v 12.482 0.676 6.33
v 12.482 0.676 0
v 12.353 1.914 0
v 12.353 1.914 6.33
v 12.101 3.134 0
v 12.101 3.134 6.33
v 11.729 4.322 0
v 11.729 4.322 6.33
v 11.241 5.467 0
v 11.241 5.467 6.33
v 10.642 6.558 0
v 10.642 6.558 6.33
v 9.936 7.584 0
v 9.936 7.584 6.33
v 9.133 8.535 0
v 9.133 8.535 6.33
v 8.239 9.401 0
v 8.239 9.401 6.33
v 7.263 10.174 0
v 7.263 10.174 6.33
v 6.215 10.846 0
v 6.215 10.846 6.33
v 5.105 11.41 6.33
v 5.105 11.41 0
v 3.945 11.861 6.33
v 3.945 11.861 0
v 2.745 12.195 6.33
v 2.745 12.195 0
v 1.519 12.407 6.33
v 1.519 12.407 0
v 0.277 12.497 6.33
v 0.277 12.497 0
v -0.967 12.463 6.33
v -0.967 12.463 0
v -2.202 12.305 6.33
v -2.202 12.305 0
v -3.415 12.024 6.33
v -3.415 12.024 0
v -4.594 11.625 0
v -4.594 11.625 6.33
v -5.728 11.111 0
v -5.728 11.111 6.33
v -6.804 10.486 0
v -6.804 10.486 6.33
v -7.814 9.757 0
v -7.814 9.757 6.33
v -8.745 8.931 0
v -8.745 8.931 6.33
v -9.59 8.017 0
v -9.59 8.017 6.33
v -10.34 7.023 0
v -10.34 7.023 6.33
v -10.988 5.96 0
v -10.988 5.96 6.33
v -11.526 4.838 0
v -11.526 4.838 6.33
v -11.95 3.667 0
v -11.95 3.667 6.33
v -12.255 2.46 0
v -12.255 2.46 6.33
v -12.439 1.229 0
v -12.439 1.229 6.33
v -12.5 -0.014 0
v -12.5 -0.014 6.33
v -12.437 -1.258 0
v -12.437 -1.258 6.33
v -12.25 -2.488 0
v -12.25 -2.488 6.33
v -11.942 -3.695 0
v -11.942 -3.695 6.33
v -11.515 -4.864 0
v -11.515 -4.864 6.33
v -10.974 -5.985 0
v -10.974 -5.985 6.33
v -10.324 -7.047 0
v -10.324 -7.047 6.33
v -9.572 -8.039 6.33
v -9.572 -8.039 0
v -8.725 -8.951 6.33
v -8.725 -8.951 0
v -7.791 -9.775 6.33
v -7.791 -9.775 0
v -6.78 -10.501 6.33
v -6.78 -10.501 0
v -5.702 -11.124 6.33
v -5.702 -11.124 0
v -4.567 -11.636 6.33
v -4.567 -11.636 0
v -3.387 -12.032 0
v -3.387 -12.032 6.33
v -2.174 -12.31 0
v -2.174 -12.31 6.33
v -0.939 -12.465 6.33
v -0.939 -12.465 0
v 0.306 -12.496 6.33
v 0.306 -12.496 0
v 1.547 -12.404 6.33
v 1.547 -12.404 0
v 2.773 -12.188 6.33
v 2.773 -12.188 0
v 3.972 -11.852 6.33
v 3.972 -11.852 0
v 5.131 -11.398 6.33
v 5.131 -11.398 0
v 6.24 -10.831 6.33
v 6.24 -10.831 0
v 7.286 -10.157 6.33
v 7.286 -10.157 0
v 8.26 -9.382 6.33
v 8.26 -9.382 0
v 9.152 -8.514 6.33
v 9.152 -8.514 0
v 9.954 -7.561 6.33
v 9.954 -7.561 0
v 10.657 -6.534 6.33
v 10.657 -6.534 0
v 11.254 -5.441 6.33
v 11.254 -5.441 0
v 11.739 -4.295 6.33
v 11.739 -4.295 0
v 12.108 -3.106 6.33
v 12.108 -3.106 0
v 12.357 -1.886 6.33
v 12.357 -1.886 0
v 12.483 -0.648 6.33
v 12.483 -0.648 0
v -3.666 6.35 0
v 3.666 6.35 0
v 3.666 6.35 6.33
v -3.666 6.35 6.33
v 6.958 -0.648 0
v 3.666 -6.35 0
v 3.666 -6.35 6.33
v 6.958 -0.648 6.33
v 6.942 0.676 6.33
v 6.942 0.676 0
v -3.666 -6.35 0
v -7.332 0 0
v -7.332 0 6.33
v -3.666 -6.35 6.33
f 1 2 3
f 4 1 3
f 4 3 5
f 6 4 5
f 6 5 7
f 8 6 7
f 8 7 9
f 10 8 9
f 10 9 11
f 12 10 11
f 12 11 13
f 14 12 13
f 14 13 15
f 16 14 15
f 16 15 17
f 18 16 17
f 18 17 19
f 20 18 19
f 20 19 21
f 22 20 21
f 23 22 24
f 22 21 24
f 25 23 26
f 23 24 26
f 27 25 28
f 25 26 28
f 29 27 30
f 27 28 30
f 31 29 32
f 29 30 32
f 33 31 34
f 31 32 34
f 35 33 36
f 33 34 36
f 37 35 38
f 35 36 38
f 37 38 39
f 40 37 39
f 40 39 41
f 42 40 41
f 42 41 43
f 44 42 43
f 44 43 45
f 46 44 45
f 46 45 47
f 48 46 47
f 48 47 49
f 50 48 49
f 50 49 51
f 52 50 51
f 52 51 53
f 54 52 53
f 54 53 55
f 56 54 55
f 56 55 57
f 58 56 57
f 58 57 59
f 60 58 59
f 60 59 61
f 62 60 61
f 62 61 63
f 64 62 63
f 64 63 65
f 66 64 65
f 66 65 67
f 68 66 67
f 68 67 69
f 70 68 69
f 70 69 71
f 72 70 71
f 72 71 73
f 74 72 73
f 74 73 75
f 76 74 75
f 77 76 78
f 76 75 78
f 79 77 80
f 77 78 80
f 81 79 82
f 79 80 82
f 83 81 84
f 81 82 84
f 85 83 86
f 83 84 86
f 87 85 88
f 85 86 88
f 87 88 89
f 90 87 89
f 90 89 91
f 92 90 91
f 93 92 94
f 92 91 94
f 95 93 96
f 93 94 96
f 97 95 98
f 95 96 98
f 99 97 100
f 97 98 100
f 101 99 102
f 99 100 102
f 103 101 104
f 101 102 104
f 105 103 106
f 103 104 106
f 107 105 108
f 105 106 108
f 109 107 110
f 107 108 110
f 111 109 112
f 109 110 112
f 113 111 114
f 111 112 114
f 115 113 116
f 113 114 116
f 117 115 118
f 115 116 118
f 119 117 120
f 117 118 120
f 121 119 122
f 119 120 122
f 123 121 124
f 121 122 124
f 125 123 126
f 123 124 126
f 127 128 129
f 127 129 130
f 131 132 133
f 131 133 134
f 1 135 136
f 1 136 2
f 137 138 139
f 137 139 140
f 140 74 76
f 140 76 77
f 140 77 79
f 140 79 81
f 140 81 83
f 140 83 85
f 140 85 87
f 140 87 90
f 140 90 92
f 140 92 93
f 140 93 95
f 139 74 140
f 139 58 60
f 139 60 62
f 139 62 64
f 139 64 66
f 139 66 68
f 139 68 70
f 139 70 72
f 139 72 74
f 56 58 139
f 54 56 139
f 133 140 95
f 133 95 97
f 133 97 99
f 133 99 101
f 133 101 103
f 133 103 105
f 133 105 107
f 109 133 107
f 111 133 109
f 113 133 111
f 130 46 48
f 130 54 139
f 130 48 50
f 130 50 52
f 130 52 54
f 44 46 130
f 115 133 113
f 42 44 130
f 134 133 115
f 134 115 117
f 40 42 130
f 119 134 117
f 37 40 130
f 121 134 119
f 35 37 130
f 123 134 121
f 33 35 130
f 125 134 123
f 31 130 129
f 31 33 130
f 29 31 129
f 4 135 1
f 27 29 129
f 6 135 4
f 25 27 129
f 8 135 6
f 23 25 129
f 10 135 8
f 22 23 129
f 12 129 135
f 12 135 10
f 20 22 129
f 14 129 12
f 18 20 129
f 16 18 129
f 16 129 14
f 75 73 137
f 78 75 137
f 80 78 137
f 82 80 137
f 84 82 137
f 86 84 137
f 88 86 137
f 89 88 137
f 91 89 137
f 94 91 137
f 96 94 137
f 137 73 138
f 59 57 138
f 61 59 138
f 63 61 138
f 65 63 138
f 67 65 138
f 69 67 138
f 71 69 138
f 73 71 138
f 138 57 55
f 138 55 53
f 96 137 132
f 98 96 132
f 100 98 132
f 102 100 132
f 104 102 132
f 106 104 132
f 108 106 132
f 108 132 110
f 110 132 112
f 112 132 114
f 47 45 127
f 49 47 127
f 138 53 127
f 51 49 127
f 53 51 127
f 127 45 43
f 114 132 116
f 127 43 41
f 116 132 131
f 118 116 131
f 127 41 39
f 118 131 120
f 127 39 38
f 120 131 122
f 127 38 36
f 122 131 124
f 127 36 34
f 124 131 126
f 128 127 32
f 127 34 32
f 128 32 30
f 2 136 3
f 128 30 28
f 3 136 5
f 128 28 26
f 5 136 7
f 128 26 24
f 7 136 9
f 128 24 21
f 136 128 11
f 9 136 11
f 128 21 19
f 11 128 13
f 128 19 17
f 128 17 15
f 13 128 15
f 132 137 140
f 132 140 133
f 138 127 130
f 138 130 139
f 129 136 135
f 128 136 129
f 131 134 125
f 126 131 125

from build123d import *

# Parameters (mm, degrees)
SKETCH1_R           = 12.5
BOSS_EXTRUDE1_DEPTH = 6.33
SKETCH2_W           = 8.461167653
SKETCH2_H           = 1.32394958
CUT_EXTRUDE1_DEPTH  = 7.33


with BuildPart() as part:
    # Sketch1 → Boss-Extrude1 (new body)
    with BuildSketch(Plane.XY):
        Circle(SKETCH1_R)
        Polygon((7.332348419, 0), (3.666174209, 6.35), (-3.666174209, 6.35), (-7.332348419, 0), (-3.666174209, -6.35), (3.666174209, -6.35), align=None, mode=Mode.SUBTRACT)
    extrude(amount=BOSS_EXTRUDE1_DEPTH)

    # Sketch2 → Cut-Extrude1 (cut, through all)
    with BuildSketch(Plane.XY.offset(6.33)):
        with Locations((10.426813654, 0.014294586)):
            Rectangle(SKETCH2_W, SKETCH2_H)
    extrude(amount=-CUT_EXTRUDE1_DEPTH, mode=Mode.SUBTRACT)


solid = part.part
